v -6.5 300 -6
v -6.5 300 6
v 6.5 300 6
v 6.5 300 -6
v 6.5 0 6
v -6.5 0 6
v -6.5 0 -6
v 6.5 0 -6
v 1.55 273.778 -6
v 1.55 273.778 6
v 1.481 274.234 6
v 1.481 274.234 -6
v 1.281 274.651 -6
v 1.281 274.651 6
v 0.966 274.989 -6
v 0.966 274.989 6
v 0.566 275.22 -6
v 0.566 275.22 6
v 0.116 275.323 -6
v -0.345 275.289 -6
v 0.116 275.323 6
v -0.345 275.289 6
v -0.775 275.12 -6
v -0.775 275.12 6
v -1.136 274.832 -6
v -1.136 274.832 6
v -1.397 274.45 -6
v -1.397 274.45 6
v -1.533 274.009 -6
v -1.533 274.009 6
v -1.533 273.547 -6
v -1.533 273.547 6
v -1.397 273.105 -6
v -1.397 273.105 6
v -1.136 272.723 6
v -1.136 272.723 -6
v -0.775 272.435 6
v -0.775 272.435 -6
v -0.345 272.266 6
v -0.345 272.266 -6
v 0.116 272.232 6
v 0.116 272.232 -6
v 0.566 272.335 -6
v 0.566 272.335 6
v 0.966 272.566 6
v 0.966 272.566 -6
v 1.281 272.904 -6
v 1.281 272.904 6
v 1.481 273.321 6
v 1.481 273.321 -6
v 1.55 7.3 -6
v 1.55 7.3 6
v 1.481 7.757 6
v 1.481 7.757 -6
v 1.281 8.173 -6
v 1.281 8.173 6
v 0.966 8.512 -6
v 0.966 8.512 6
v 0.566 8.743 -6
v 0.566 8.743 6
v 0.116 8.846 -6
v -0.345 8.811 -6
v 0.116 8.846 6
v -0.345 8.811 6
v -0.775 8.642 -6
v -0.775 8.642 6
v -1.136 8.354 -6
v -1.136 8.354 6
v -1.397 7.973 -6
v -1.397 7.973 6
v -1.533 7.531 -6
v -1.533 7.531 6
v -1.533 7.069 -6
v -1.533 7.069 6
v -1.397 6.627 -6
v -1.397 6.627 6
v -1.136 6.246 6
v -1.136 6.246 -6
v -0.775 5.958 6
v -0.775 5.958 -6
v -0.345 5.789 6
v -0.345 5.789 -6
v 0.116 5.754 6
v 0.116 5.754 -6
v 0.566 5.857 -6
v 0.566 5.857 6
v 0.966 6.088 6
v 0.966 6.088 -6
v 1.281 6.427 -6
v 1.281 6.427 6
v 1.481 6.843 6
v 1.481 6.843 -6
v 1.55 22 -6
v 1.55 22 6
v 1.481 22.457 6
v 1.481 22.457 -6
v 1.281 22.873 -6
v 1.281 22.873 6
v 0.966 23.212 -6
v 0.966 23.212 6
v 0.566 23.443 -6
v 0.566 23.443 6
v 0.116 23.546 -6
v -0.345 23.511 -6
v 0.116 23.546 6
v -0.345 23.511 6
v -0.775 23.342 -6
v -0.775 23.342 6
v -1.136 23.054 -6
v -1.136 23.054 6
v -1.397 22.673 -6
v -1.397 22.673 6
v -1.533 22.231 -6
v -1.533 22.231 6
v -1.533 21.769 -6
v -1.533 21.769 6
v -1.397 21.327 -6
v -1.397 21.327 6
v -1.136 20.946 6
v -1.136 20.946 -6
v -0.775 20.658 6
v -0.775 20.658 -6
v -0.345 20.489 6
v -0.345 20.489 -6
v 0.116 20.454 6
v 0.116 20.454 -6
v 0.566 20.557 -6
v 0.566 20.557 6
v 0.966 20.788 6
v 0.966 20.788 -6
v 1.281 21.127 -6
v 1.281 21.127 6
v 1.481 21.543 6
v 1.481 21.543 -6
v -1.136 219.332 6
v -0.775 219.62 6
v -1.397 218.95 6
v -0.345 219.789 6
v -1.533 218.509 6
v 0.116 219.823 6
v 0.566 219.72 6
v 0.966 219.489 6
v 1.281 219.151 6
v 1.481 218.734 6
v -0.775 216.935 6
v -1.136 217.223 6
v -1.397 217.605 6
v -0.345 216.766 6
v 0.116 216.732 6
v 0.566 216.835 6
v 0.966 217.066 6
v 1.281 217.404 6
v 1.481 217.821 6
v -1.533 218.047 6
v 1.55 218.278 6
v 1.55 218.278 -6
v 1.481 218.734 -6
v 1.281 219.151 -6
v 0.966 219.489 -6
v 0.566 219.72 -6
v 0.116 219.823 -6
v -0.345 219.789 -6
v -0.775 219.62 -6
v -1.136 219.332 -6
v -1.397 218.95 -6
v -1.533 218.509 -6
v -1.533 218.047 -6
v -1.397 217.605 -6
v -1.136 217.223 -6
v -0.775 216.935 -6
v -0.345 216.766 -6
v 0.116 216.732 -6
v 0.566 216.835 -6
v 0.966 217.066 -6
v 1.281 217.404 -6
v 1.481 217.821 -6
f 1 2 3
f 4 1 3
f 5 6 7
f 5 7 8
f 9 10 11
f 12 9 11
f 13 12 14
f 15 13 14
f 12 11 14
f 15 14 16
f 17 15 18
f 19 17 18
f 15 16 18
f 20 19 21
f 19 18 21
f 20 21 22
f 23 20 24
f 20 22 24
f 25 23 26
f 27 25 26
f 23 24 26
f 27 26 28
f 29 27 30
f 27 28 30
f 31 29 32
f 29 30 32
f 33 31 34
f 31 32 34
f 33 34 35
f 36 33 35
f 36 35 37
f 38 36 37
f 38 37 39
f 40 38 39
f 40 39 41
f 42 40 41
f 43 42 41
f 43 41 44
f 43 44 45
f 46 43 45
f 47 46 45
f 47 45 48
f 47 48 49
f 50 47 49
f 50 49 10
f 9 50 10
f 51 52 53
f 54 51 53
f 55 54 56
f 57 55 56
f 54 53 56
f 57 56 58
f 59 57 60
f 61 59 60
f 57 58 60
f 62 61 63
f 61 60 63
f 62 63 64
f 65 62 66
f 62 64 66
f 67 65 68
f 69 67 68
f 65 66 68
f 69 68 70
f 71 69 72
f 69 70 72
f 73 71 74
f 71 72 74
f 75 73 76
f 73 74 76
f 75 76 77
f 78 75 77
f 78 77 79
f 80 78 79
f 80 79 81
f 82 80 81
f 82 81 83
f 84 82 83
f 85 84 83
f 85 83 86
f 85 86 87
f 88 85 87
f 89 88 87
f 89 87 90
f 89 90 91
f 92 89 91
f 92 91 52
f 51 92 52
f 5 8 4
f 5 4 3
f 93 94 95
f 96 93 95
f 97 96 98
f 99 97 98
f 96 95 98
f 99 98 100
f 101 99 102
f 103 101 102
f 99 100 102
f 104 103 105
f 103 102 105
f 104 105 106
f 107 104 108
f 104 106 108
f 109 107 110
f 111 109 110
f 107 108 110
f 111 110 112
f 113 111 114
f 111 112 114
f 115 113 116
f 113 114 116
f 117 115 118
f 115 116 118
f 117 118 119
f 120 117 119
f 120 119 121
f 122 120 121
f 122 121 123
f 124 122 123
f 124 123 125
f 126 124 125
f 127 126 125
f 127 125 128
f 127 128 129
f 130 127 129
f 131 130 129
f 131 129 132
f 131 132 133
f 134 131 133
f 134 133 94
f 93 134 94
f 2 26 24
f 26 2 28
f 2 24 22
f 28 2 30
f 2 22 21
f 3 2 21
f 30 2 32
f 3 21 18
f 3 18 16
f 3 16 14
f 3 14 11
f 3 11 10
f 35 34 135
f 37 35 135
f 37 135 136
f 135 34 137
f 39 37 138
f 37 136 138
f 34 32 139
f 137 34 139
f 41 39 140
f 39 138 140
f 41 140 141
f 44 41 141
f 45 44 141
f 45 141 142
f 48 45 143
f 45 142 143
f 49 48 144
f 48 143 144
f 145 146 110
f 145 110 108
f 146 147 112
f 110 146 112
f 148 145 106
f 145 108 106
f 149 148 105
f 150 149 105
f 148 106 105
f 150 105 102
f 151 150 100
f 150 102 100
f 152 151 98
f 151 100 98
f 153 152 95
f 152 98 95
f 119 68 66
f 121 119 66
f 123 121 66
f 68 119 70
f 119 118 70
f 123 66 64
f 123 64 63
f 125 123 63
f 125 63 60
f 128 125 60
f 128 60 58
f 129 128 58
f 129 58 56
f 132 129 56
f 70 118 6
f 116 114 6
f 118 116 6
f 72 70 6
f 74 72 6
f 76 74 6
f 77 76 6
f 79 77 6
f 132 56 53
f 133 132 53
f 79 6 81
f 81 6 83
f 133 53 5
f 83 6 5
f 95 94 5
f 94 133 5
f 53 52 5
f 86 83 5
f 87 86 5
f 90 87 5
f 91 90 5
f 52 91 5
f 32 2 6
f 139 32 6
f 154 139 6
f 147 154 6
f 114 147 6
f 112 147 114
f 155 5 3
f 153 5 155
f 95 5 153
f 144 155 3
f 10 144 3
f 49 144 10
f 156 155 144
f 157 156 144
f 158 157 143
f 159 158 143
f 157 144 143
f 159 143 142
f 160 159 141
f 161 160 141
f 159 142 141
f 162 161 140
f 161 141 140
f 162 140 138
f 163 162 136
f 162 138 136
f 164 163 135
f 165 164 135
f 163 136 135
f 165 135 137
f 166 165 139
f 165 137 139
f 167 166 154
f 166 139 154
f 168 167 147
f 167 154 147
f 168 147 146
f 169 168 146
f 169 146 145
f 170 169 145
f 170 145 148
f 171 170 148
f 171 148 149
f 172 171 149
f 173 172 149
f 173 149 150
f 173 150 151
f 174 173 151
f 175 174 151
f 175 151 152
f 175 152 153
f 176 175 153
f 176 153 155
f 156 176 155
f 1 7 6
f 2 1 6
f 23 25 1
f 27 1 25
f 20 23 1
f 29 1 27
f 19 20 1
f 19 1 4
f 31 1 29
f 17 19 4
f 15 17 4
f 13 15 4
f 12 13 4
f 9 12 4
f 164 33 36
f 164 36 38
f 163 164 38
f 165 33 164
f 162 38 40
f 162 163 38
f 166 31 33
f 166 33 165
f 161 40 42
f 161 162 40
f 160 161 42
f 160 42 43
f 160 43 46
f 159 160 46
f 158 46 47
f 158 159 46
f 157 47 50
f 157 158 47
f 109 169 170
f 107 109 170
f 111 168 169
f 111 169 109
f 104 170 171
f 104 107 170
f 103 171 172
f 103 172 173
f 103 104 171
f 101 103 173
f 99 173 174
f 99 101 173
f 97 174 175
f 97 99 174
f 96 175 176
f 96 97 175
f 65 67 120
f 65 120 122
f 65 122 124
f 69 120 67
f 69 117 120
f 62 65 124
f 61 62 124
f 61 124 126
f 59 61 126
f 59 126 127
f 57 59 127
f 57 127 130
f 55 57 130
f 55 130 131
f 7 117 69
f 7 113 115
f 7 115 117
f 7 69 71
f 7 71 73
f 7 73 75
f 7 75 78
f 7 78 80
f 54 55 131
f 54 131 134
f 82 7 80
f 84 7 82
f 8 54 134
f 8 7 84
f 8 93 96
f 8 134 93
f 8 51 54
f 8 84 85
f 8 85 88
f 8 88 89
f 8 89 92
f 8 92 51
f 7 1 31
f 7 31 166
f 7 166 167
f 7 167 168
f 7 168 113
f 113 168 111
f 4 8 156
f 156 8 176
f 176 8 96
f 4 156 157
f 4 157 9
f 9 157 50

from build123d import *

# Parameters (mm, degrees)
F0_W     = 13
F0_H     = 12
F1_DEPTH = 300
F2_R     = 1.55
F3_DEPTH = 12.001
F4_R     = 1.55
F5_DEPTH = 25


with BuildPart() as f1:
    # F0 (on Front) → F1 (new body)
    with BuildSketch(Plane.XZ):
        Rectangle(F0_W, F0_H)
    extrude(amount=-F1_DEPTH)

    # F2 (on face) → F3 (cut, through all)
    with BuildSketch(Plane.XY.offset(6)):
        with Locations((0, 7.3)):
            Circle(F2_R)
        with Locations((0, 22)):
            Circle(F2_R)
    extrude(amount=-F3_DEPTH, mode=Mode.SUBTRACT)

    # F4 (on face) → F5 (cut)
    with BuildSketch(Plane.XY.offset(6)):
        with Locations((0, 273.777529)):
            Circle(F4_R)
        with Locations((0, 218.277529)):
            Circle(F4_R)
    extrude(amount=-F5_DEPTH, mode=Mode.SUBTRACT)


solid = f1.part
